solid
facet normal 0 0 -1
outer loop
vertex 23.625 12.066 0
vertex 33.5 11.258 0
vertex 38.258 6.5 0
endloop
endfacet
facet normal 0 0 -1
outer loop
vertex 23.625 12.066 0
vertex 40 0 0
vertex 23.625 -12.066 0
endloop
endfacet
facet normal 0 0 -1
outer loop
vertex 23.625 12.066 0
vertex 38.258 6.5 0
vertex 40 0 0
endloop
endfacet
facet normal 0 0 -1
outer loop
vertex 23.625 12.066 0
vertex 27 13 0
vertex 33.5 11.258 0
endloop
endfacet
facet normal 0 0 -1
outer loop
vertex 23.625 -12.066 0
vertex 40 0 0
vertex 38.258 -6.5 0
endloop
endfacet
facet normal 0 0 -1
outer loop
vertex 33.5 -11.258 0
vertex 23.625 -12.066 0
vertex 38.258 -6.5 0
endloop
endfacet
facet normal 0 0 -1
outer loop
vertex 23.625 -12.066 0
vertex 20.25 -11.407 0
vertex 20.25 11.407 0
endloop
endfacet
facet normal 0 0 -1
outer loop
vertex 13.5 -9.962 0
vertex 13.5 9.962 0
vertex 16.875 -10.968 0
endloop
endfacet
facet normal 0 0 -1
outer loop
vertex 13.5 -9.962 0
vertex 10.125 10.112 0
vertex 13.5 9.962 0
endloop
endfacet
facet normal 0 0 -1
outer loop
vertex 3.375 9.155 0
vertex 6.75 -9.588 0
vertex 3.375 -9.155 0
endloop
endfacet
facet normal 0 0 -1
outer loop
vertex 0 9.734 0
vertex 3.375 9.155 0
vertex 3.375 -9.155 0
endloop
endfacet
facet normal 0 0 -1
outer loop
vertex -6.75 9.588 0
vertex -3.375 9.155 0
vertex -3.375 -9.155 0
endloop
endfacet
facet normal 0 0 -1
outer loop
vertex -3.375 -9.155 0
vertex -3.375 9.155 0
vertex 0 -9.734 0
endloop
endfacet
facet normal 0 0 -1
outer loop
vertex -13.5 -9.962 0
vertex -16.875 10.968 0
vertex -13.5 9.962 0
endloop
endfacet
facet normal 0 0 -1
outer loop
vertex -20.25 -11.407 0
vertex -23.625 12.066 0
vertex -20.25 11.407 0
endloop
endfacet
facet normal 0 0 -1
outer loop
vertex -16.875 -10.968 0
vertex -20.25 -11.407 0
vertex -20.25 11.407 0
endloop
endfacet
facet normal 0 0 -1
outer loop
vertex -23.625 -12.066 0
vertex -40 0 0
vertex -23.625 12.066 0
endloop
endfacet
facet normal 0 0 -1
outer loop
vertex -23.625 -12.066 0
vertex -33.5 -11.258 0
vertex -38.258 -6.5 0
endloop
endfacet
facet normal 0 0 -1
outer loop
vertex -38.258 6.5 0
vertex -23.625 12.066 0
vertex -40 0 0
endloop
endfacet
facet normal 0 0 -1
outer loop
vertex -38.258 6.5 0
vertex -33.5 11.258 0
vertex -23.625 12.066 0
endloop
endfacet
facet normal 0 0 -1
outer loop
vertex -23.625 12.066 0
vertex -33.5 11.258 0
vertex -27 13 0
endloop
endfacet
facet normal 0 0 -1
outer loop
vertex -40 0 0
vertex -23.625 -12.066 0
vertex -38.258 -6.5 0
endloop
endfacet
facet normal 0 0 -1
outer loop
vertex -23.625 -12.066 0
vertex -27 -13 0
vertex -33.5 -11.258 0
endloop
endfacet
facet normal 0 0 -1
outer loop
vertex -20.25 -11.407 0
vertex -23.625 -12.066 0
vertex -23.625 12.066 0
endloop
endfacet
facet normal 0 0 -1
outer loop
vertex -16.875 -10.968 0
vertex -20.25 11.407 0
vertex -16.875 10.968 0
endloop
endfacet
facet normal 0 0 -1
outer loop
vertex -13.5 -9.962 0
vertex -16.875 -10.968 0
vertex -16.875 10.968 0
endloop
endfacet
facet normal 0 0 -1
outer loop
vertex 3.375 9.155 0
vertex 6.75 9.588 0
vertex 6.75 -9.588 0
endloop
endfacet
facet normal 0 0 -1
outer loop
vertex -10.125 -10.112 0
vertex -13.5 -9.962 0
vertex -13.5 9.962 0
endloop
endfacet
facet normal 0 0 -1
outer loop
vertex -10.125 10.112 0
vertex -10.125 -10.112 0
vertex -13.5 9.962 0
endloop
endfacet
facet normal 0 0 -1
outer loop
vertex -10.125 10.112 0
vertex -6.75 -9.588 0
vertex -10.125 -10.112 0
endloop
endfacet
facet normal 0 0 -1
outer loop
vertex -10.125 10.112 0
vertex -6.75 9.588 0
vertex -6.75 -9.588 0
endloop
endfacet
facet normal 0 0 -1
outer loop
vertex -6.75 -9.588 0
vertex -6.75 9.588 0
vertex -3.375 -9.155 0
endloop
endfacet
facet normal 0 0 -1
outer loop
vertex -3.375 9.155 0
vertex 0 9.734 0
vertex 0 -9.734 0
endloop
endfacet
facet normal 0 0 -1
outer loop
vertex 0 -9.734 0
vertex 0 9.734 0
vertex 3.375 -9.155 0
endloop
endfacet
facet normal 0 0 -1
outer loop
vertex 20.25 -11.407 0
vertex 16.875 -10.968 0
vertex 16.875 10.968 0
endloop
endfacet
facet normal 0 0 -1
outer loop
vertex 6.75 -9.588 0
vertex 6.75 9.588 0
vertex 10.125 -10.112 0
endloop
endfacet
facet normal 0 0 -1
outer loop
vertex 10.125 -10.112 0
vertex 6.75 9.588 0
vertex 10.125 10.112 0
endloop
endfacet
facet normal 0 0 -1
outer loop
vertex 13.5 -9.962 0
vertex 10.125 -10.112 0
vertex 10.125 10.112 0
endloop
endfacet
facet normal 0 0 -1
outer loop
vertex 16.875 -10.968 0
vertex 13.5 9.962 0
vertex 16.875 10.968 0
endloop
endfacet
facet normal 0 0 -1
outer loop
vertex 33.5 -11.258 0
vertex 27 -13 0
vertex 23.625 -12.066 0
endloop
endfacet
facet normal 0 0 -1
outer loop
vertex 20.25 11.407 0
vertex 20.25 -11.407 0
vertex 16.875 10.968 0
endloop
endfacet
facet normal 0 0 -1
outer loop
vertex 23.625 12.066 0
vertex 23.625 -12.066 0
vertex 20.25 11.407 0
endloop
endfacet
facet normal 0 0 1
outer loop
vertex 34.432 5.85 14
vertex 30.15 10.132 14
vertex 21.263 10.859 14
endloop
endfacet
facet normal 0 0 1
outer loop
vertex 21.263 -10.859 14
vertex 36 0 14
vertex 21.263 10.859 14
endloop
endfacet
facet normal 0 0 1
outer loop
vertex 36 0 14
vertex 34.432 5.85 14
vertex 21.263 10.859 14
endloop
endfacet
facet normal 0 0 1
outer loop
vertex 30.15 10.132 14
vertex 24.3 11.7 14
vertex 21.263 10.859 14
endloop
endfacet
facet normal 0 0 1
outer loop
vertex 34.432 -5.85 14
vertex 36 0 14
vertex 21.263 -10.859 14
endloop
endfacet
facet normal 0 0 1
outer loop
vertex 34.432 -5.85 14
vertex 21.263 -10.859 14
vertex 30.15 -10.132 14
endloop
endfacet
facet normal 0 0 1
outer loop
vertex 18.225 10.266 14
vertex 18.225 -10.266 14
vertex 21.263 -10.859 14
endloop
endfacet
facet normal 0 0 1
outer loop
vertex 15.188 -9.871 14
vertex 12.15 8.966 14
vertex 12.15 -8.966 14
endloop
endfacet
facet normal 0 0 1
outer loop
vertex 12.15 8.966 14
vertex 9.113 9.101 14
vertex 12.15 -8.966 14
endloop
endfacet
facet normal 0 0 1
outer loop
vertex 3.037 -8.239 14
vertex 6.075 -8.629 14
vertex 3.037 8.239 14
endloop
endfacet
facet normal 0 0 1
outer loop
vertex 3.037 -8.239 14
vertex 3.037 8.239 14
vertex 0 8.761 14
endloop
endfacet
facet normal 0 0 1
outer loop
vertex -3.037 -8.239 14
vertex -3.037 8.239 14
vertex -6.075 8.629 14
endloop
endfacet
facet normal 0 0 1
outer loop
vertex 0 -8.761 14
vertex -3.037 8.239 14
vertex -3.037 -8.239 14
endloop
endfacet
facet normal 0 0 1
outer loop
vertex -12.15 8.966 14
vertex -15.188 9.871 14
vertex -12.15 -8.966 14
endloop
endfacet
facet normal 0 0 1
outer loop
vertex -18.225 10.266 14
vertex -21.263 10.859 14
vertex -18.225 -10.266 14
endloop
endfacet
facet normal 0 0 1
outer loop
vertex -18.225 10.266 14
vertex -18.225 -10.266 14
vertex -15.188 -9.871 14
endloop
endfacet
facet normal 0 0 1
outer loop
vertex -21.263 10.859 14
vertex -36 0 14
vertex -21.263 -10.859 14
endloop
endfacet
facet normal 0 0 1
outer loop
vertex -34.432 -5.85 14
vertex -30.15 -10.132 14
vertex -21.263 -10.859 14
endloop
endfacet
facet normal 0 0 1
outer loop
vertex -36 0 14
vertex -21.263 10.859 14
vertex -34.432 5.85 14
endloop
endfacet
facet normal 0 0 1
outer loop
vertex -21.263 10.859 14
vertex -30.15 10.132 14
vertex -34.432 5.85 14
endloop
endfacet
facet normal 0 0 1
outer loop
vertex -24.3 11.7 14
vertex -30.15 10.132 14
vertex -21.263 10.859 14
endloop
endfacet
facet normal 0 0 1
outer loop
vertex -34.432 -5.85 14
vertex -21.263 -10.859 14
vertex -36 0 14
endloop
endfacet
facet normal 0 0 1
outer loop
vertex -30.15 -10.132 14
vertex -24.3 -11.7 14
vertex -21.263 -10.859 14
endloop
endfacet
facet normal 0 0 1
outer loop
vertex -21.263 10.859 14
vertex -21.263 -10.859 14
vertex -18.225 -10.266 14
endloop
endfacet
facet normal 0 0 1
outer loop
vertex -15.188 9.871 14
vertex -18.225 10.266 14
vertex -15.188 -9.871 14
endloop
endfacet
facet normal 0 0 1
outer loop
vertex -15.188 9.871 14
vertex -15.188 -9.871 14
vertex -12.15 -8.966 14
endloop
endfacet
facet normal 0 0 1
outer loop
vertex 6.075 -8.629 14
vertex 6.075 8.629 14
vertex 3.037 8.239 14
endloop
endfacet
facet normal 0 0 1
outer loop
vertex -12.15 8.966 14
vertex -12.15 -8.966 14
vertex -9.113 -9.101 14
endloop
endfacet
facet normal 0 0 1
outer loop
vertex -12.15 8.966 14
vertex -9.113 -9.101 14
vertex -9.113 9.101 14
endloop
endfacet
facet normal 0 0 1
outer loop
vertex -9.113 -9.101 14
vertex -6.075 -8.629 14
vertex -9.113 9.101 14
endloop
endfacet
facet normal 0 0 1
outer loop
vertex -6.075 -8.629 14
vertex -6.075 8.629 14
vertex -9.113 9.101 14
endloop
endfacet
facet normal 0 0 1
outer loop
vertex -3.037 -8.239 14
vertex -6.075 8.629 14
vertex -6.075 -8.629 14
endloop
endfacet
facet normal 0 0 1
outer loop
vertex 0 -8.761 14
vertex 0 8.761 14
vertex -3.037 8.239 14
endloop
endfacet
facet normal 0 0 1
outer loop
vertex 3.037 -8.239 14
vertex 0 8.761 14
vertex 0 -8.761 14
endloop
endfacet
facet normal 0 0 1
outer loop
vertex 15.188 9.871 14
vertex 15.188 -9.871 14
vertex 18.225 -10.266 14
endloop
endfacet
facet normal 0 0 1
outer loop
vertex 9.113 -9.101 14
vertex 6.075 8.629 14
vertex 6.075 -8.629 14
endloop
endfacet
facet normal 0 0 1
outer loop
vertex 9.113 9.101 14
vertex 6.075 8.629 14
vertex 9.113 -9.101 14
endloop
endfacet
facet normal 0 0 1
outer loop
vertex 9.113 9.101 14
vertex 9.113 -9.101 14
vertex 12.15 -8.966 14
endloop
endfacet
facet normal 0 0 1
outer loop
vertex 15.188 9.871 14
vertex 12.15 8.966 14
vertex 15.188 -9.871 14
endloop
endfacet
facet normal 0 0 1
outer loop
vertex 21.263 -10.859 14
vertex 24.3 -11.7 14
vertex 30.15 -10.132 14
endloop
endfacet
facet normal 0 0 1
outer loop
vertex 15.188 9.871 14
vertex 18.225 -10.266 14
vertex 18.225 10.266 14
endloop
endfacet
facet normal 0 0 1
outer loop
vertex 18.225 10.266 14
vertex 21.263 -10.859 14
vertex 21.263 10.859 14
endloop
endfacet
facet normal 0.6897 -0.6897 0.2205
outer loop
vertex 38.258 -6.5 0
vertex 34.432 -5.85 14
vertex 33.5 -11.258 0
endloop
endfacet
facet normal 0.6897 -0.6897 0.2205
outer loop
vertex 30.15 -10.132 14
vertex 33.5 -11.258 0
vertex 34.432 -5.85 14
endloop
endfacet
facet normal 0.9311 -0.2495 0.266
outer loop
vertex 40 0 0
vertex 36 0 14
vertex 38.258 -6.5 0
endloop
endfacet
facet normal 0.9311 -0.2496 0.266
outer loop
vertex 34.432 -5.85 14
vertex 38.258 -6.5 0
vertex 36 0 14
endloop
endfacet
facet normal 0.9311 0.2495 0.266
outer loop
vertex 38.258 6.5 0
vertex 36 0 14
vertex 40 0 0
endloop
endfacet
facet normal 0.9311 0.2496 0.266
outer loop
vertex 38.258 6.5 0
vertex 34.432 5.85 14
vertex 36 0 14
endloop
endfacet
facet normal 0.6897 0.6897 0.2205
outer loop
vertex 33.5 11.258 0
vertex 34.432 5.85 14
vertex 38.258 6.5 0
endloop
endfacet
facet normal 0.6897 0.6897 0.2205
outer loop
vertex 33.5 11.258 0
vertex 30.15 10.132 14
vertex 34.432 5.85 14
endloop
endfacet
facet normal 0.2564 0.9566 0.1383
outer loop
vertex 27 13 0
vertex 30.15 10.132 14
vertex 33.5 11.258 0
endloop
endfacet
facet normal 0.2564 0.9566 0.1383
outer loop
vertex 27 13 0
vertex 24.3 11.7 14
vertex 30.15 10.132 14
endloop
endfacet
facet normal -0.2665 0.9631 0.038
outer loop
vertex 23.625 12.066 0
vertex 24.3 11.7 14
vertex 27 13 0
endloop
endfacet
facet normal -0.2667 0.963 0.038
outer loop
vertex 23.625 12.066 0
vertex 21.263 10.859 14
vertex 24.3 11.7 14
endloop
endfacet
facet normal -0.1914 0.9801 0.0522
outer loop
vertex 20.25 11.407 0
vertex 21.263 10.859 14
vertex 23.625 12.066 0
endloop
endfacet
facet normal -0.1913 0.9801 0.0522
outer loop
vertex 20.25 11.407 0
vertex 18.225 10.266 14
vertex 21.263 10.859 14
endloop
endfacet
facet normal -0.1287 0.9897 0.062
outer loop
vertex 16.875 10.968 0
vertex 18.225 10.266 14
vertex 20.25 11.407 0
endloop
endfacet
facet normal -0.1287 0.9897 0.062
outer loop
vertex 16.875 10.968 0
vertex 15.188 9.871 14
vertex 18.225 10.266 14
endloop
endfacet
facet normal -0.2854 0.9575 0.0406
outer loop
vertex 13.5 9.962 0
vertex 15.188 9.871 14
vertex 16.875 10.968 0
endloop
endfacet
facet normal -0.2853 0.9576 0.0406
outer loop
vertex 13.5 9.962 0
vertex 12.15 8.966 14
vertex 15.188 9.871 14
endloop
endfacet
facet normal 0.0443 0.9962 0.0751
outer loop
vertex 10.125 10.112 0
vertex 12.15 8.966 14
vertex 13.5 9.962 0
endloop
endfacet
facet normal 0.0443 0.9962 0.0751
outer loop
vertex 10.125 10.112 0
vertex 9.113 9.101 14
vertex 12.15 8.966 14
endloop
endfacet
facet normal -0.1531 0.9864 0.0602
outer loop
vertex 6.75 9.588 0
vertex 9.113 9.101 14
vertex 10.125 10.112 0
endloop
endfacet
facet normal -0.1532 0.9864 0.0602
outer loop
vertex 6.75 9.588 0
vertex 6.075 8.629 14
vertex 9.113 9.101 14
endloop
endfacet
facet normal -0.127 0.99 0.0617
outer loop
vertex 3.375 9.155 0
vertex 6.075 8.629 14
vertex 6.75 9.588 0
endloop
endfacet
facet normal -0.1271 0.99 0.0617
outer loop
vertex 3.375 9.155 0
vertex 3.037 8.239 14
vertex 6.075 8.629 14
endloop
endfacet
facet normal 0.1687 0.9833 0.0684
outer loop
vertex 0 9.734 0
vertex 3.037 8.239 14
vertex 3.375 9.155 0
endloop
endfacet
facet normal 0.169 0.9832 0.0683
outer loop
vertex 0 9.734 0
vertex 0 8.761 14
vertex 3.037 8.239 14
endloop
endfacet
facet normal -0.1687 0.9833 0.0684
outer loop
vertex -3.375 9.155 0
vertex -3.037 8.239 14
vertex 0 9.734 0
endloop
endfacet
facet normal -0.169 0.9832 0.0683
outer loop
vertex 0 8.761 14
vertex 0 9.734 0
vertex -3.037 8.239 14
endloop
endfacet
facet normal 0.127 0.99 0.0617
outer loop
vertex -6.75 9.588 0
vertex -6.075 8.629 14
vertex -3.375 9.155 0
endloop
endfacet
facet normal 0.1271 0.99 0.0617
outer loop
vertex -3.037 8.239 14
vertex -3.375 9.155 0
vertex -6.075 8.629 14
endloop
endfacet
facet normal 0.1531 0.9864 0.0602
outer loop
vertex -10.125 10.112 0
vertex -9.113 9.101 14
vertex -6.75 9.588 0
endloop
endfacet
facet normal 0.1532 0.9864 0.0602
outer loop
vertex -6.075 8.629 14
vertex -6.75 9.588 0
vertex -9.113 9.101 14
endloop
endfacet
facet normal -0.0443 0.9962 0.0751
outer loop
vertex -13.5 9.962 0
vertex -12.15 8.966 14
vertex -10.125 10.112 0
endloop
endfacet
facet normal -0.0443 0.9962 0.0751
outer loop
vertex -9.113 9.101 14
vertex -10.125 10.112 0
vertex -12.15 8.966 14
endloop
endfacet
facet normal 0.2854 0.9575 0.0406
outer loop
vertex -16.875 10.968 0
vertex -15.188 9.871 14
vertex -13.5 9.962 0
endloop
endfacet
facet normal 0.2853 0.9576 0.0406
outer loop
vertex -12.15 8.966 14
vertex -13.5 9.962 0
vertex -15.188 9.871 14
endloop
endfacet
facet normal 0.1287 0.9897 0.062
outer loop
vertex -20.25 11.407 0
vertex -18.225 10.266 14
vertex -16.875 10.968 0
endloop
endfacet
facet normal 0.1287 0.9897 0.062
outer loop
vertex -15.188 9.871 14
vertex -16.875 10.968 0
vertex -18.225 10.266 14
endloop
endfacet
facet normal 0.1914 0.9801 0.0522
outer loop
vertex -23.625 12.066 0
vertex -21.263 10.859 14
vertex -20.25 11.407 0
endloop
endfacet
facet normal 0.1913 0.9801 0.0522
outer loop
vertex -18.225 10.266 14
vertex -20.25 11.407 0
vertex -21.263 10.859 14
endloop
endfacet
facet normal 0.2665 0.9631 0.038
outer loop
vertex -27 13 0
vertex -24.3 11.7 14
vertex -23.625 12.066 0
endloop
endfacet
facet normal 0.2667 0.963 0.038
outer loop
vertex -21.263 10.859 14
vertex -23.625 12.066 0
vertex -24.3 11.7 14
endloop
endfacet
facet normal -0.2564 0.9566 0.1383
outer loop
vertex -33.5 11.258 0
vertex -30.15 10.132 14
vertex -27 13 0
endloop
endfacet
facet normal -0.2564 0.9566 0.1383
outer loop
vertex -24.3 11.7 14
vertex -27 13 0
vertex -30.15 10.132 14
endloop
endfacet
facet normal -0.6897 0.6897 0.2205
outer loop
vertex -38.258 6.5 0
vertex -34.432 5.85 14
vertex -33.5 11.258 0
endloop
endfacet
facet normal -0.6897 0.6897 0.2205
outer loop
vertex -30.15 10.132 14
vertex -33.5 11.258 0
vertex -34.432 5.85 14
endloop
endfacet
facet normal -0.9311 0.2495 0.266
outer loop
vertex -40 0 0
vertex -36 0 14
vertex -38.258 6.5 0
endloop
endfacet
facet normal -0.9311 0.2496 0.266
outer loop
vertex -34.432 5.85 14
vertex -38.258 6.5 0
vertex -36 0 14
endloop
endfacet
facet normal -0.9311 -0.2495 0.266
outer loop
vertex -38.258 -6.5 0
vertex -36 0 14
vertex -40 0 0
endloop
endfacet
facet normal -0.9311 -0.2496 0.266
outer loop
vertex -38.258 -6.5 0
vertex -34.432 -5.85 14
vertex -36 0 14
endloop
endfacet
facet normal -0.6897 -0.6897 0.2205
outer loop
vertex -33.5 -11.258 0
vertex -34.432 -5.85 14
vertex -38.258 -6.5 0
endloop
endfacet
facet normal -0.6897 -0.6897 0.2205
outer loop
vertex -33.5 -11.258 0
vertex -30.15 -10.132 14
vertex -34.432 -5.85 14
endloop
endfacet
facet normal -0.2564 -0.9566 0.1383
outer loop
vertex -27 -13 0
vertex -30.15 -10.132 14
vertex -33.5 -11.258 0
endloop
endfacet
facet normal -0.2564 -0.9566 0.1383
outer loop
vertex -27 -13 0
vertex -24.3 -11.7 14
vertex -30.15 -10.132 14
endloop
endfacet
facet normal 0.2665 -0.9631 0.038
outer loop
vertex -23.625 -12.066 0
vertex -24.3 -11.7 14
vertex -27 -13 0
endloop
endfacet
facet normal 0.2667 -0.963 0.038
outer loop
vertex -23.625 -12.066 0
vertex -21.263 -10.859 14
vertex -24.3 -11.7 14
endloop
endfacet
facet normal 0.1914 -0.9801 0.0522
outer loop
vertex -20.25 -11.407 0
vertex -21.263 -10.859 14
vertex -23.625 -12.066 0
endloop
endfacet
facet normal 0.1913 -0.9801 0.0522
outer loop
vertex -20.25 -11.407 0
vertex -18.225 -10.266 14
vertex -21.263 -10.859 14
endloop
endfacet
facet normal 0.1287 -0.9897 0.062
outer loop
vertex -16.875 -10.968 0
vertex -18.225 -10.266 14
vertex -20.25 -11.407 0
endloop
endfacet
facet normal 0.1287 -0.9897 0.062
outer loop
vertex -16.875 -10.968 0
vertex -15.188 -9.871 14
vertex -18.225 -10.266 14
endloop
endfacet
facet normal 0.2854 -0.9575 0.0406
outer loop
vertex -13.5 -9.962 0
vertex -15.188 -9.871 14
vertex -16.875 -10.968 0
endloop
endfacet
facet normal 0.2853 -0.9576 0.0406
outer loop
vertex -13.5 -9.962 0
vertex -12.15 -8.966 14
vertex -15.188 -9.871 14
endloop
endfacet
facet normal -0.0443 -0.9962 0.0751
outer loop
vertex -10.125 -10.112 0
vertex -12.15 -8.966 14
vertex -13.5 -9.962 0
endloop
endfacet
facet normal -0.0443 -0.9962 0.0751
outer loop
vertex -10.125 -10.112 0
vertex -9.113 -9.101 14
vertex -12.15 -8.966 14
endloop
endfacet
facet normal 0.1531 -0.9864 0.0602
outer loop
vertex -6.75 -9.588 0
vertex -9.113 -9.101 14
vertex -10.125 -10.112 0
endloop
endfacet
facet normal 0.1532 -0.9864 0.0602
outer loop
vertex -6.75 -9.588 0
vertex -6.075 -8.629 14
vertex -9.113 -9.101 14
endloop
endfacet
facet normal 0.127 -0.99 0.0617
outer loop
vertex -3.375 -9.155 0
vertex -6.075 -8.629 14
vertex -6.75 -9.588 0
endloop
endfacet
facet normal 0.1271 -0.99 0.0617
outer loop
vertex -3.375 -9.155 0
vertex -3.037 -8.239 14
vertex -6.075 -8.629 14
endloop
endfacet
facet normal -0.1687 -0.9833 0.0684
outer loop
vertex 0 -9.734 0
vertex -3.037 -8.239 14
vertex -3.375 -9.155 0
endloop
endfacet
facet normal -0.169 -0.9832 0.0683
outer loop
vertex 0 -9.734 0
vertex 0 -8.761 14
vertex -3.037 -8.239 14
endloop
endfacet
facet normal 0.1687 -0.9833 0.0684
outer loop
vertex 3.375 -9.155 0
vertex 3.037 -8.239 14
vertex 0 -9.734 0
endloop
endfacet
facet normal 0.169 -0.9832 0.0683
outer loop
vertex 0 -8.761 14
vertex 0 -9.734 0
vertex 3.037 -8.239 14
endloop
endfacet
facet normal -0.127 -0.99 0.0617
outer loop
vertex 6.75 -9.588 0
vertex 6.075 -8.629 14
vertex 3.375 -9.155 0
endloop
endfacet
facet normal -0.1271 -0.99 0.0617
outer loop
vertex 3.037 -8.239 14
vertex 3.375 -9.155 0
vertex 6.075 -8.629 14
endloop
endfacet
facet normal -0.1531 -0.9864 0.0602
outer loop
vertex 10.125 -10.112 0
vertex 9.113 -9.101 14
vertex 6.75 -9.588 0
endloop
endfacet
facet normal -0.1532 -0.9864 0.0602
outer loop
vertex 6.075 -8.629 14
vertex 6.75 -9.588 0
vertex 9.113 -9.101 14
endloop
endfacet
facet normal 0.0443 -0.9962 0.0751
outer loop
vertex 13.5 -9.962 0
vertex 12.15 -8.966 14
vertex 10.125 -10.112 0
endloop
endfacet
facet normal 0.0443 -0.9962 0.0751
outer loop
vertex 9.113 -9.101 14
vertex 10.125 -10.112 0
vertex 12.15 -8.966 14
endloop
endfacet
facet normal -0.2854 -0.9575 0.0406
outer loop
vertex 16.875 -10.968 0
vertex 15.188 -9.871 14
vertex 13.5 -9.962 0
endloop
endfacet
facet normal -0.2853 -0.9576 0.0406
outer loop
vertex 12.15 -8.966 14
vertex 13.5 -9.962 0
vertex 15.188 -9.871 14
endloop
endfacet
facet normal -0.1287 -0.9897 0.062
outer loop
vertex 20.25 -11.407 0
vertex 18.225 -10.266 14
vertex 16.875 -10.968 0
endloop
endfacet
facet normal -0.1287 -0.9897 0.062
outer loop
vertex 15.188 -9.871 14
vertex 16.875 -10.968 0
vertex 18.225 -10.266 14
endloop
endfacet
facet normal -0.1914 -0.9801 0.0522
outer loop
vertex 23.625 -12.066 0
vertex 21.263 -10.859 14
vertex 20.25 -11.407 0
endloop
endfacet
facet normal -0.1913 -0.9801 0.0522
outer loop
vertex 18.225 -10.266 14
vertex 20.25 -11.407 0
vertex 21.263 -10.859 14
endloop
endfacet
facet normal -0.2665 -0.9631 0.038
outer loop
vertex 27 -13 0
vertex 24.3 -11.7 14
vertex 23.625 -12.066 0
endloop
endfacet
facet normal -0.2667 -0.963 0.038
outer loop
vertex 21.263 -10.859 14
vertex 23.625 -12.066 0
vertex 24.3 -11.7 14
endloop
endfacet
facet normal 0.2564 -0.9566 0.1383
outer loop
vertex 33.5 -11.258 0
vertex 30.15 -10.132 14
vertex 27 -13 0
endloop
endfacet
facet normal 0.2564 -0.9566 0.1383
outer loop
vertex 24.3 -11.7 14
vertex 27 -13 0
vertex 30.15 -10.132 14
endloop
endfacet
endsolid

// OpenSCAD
$fn = 32;

// ----------------------------------------------------------------------
// Handle: 80 x 26 mm grip, 14 mm thick
// ----------------------------------------------------------------------

// --- parameters (mm) ---
length = 80;              // grip length
width = 26;               // grip width
thickness = 14;           // grip thickness
waist = 0.72;             // width factor at the middle
draft = 0.9;              // top face scale of the extrusion
scallops = 6;             // finger rests per side
ripple = 0.04;            // depth factor of the finger rests

/* ergonomic grip outline, closed spline-like polygon in the XY plane */
grip = [[-27, 13], [-23.625, 12.066], [-20.25, 11.407], [-16.875, 10.968], [-13.5, 9.962], [-10.125, 10.112], [-6.75, 9.588], [-3.375, 9.155], [0, 9.734], [3.375, 9.155], [6.75, 9.588], [10.125, 10.112], [13.5, 9.962], [16.875, 10.968], [20.25, 11.407], [23.625, 12.066], [27, 13], [33.5, 11.258], [38.258, 6.5], [40, 0], [38.258, -6.5], [33.5, -11.258], [27, -13], [27, -13], [23.625, -12.066], [20.25, -11.407], [16.875, -10.968], [13.5, -9.962], [10.125, -10.112], [6.75, -9.588], [3.375, -9.155], [0, -9.734], [-3.375, -9.155], [-6.75, -9.588], [-10.125, -10.112], [-13.5, -9.962], [-16.875, -10.968], [-20.25, -11.407], [-23.625, -12.066], [-27, -13], [-33.5, -11.258], [-38.258, -6.5], [-40, 0], [-38.258, 6.5], [-33.5, 11.258], [-27, 13]];

module grip_body() {
  linear_extrude(height = thickness, scale = draft) polygon(grip);
}

difference() {
  union() {
    grip_body();
  }
}
